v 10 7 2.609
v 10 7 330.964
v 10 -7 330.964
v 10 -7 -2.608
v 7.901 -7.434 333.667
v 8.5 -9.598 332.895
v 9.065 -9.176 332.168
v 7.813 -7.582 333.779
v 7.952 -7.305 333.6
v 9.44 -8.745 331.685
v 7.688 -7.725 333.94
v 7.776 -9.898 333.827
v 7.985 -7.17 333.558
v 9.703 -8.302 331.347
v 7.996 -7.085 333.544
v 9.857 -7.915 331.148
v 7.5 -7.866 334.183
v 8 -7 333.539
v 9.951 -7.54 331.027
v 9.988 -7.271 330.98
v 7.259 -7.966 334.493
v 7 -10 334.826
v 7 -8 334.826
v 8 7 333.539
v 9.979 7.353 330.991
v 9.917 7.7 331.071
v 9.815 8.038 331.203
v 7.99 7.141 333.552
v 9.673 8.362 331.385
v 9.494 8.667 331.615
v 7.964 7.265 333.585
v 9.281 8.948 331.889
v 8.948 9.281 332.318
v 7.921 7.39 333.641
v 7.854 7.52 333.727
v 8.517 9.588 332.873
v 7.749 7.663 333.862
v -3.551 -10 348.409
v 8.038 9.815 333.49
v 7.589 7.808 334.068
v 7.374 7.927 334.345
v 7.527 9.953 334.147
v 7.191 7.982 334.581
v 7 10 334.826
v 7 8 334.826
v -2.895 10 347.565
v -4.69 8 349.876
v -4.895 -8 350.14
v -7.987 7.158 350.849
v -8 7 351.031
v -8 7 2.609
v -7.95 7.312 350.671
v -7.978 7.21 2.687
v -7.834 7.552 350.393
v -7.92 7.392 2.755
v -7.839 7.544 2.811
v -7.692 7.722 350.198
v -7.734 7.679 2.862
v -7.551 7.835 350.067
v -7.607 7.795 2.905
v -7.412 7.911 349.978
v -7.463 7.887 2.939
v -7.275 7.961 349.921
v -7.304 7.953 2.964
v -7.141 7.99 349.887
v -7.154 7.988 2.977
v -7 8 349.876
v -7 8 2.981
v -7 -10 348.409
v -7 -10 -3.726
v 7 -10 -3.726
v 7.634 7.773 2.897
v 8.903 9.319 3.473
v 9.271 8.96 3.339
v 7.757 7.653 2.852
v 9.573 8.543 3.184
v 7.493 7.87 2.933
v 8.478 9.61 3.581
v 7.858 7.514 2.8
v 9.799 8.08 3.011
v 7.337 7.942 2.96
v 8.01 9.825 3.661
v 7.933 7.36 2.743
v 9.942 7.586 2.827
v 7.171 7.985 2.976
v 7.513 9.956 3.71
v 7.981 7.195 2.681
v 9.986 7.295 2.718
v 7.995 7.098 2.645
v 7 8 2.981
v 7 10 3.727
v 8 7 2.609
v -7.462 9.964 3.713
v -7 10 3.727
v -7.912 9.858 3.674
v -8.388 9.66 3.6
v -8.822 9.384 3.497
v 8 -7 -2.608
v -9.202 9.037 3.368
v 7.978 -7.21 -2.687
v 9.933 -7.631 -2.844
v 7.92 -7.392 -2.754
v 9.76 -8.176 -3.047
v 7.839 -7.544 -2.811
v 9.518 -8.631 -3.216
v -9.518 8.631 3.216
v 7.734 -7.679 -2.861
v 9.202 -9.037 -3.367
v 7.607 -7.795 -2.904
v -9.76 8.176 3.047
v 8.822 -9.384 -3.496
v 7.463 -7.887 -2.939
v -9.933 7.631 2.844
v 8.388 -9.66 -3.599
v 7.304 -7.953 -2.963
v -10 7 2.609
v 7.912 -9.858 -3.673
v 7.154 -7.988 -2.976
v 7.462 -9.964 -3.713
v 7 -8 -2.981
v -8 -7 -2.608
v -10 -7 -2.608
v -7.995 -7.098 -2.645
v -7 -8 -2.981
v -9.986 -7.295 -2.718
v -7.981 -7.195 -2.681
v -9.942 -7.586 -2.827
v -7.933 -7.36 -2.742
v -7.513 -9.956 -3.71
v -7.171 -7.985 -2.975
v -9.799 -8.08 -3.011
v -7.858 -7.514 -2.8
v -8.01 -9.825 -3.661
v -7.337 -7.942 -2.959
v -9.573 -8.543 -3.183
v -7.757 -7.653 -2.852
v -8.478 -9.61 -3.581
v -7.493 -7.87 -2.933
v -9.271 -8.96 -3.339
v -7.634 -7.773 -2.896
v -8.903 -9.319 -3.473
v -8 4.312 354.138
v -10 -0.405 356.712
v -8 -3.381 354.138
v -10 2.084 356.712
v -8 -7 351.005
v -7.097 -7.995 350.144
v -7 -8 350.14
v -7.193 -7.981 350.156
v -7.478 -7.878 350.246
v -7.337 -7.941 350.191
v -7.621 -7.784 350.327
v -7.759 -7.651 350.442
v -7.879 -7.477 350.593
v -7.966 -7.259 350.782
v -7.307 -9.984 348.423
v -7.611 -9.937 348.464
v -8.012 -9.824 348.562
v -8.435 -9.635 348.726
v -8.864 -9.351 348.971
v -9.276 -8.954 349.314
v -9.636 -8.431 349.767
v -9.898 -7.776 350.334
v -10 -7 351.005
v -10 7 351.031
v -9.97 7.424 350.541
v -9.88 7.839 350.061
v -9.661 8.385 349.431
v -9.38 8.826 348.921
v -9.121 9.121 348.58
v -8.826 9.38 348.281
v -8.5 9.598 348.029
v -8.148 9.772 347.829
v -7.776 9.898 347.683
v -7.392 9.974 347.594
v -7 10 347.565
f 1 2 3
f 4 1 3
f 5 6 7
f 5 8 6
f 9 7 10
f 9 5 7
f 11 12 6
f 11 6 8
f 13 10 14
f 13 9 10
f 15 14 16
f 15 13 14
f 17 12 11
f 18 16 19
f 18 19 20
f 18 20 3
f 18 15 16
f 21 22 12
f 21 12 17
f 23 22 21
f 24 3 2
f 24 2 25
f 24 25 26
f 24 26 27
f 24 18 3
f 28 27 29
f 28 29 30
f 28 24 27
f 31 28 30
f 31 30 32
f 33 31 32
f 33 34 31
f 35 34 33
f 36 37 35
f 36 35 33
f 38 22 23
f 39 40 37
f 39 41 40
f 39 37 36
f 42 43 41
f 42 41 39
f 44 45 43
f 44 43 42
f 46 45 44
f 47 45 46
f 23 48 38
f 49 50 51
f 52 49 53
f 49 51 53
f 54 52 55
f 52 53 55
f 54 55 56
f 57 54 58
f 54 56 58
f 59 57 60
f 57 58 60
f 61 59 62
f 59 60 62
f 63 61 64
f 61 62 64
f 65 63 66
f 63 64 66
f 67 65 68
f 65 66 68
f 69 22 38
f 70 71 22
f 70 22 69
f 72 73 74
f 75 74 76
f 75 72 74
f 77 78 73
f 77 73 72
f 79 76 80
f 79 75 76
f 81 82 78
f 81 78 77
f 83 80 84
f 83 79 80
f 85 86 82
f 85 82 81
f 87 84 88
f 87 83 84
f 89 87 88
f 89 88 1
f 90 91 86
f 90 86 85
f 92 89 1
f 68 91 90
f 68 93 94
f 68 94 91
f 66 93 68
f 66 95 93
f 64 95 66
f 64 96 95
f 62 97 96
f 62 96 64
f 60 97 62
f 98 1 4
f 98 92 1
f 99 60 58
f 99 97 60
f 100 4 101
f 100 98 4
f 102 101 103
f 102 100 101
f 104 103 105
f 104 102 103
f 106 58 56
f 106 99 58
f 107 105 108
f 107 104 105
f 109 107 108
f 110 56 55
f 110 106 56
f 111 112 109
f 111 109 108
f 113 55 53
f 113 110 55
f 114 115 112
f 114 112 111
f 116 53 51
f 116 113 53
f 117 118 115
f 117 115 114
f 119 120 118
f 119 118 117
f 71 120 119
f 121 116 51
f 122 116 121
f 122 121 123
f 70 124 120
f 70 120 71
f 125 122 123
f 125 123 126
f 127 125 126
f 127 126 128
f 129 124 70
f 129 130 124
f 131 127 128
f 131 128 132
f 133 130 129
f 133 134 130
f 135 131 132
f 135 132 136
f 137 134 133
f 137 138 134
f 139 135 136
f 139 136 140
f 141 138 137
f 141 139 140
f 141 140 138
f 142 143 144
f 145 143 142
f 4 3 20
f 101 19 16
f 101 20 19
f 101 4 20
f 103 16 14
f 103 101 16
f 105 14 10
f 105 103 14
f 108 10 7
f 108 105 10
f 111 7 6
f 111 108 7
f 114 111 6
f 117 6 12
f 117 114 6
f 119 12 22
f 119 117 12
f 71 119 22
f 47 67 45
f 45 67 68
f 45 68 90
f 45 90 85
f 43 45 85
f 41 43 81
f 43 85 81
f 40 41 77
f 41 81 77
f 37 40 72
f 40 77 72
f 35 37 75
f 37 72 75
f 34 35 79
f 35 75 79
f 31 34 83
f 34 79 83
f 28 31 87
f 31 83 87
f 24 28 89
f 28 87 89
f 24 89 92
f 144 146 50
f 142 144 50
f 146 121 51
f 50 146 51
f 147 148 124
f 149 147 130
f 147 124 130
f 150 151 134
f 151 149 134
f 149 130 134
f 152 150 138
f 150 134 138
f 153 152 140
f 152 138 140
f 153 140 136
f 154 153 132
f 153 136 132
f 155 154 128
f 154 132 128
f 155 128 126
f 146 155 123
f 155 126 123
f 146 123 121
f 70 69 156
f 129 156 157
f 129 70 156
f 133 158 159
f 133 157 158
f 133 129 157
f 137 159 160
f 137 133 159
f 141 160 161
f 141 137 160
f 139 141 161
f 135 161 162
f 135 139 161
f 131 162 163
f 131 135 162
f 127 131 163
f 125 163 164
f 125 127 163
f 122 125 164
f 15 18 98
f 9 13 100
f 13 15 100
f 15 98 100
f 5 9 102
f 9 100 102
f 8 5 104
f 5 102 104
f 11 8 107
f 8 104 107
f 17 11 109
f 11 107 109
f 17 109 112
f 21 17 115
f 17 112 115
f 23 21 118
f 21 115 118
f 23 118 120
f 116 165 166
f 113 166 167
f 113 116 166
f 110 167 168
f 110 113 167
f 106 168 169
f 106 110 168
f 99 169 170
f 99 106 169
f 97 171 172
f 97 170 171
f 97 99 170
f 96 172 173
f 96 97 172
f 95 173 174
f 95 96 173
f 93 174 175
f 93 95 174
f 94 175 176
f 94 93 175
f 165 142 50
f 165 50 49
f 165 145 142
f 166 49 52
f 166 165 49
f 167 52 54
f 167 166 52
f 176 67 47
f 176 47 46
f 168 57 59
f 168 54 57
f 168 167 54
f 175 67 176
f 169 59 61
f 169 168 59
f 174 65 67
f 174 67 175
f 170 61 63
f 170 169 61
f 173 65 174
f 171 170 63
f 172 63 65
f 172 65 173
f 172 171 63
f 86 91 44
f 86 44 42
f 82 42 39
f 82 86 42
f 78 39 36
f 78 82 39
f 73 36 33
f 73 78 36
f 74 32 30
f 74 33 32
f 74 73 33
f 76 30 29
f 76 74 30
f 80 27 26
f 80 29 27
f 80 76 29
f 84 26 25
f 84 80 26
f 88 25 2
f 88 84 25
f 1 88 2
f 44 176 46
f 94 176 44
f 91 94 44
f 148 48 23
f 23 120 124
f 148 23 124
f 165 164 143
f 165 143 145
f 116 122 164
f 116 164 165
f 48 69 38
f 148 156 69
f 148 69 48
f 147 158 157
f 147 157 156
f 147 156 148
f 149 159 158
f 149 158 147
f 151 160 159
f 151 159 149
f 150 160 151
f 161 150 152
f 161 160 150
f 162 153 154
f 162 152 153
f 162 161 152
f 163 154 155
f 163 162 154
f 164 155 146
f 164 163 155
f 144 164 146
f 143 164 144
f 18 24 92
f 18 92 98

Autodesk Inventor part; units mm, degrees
ref_plane "Start Plane" through (0, 0, -3.7262) normal (0, 0, 1) x (1, 0, 0)
ref_plane "End Plane" through (0, 0, 356.7124) normal (0, 0, 1) x (1, 0, 0)
sketch "Sketch" plane through (0, 0, 0) normal (0, 0, 1) x (1, 0, 0)
  line L0 (-10, -7) -> (-10, 7)
  line L1 (-7, 10) -> (7, 10)
  line L2 (10, 7) -> (10, -7)
  line L3 (7, -10) -> (-7, -10)
  arc A0 (-10, -7) -> (-7, -10) centre (-7, -7) ccw
  arc A1 (-7, 10) -> (-10, 7) centre (-7, 7) ccw
  arc A2 (10, 7) -> (7, 10) centre (7, 7) ccw
  arc A3 (7, -10) -> (10, -7) centre (7, -7) ccw
  arc A4 (-7, 8) -> (-8, 7) centre (-7, 7) ccw
  line L4 (-7, 8) -> (7, 8)
  arc A5 (8, 7) -> (7, 8) centre (7, 7) ccw
  line L5 (8, 7) -> (8, -7)
  arc A6 (7, -8) -> (8, -7) centre (7, -7) ccw
  line L6 (7, -8) -> (-7, -8)
  arc A7 (-8, -7) -> (-7, -8) centre (-7, -7) ccw
  line L7 (-8, -7) -> (-8, 7)
  line L8 (0, 14.8698) -> (0, -14.8698) construction
  line L9 (-14.8698, 0) -> (14.8698, 0) construction
  dimension "d7" = 3
  dimension "d10" = 20
  dimension "d11" = 20
  dimension "d12" = 2
  dimension "d15" = 10
  dimension "d16" = 10
extrude "Body" add sketch "Sketch" along normal up to surface (360.4385 mm away) from surface at -3.7262
sketch "Sketch3" plane through (0, 0, 0) normal (0, 0, 1) x (1, 0, 0)
  line L0 (0, 0) -> (10, 0)
ref_plane "Work Plane3" through (0, 0, 0) normal (0, -1, 0) x (1, 0, 0)
sketch "Sketch4" plane through (0, 0, 0) normal (0, -1, 0) x (1, 0, 0)
  line L0 (-2, -3.7262) -> (12, -3.7262)
  line L1 (-2, 356.7124) -> (12, 356.7124)
  dimension "d18" = 360.4385
ref_plane "Work Plane4" through (0, -10, -3.7262) normal (0, 0.3492, -0.9371) x (1, 0, 0)
split "Split1" plane through (0, -10, -3.7262) removes the side toward (0, 0.3492, -0.9371)
ref_plane "Work Plane6" through (-10, 0, 356.7124) normal (0.7897, 0, 0.6134) x (0.6134, 0, -0.7897)
split "Split3" plane through (-10, 0, 356.7124) removes the side toward (0.7897, 0, 0.6134)
ref_plane "Work Plane7" through (310, 12.1423, 345.0892) normal (0, 0.7562, 0.6544) x (1, 0, 0)
split "Split4" plane through (310, 12.1423, 345.0892) removes the side toward (0, 0.7562, 0.6544)
ref_plane "Work Plane8" through (310, -1.2506, 355.9809) normal (0, -0.6544, 0.7562) x (1, 0, 0)
split "Split5" plane through (310, -1.2506, 355.9809) removes the side toward (0, -0.6544, 0.7562)
equation "\"d7\" = G_IR"
equation "\"d10\" = G_H"
equation "\"d11\" = G_W"
equation "\"d12\" = G_T"
equation "\"d15\" = 0.5 * d10"
equation "\"d16\" = 0.5 * d11"
equation "\"d3\" = G_L"
equation "\"G_W\" = 20"
equation "\"G_H\" = 20"
equation "\"G_T\" = 2"
equation "\"G_IR\" = 3"
equation "\"G_L\" = d18"
equation "\"G_OFFSET_START\" = 3.72616"
equation "\"G_OFFSET_END\" = 12.87375"
equation "\"d13\" = -G_OFFSET_START"
equation "\"d14\" = G_OFFSET_END + B_L"
equation "\"B_L\" = 343.83862"
properties part number "ISO 12633-2 - 20x20x2 - 360,44" material "Steel, Mild"
